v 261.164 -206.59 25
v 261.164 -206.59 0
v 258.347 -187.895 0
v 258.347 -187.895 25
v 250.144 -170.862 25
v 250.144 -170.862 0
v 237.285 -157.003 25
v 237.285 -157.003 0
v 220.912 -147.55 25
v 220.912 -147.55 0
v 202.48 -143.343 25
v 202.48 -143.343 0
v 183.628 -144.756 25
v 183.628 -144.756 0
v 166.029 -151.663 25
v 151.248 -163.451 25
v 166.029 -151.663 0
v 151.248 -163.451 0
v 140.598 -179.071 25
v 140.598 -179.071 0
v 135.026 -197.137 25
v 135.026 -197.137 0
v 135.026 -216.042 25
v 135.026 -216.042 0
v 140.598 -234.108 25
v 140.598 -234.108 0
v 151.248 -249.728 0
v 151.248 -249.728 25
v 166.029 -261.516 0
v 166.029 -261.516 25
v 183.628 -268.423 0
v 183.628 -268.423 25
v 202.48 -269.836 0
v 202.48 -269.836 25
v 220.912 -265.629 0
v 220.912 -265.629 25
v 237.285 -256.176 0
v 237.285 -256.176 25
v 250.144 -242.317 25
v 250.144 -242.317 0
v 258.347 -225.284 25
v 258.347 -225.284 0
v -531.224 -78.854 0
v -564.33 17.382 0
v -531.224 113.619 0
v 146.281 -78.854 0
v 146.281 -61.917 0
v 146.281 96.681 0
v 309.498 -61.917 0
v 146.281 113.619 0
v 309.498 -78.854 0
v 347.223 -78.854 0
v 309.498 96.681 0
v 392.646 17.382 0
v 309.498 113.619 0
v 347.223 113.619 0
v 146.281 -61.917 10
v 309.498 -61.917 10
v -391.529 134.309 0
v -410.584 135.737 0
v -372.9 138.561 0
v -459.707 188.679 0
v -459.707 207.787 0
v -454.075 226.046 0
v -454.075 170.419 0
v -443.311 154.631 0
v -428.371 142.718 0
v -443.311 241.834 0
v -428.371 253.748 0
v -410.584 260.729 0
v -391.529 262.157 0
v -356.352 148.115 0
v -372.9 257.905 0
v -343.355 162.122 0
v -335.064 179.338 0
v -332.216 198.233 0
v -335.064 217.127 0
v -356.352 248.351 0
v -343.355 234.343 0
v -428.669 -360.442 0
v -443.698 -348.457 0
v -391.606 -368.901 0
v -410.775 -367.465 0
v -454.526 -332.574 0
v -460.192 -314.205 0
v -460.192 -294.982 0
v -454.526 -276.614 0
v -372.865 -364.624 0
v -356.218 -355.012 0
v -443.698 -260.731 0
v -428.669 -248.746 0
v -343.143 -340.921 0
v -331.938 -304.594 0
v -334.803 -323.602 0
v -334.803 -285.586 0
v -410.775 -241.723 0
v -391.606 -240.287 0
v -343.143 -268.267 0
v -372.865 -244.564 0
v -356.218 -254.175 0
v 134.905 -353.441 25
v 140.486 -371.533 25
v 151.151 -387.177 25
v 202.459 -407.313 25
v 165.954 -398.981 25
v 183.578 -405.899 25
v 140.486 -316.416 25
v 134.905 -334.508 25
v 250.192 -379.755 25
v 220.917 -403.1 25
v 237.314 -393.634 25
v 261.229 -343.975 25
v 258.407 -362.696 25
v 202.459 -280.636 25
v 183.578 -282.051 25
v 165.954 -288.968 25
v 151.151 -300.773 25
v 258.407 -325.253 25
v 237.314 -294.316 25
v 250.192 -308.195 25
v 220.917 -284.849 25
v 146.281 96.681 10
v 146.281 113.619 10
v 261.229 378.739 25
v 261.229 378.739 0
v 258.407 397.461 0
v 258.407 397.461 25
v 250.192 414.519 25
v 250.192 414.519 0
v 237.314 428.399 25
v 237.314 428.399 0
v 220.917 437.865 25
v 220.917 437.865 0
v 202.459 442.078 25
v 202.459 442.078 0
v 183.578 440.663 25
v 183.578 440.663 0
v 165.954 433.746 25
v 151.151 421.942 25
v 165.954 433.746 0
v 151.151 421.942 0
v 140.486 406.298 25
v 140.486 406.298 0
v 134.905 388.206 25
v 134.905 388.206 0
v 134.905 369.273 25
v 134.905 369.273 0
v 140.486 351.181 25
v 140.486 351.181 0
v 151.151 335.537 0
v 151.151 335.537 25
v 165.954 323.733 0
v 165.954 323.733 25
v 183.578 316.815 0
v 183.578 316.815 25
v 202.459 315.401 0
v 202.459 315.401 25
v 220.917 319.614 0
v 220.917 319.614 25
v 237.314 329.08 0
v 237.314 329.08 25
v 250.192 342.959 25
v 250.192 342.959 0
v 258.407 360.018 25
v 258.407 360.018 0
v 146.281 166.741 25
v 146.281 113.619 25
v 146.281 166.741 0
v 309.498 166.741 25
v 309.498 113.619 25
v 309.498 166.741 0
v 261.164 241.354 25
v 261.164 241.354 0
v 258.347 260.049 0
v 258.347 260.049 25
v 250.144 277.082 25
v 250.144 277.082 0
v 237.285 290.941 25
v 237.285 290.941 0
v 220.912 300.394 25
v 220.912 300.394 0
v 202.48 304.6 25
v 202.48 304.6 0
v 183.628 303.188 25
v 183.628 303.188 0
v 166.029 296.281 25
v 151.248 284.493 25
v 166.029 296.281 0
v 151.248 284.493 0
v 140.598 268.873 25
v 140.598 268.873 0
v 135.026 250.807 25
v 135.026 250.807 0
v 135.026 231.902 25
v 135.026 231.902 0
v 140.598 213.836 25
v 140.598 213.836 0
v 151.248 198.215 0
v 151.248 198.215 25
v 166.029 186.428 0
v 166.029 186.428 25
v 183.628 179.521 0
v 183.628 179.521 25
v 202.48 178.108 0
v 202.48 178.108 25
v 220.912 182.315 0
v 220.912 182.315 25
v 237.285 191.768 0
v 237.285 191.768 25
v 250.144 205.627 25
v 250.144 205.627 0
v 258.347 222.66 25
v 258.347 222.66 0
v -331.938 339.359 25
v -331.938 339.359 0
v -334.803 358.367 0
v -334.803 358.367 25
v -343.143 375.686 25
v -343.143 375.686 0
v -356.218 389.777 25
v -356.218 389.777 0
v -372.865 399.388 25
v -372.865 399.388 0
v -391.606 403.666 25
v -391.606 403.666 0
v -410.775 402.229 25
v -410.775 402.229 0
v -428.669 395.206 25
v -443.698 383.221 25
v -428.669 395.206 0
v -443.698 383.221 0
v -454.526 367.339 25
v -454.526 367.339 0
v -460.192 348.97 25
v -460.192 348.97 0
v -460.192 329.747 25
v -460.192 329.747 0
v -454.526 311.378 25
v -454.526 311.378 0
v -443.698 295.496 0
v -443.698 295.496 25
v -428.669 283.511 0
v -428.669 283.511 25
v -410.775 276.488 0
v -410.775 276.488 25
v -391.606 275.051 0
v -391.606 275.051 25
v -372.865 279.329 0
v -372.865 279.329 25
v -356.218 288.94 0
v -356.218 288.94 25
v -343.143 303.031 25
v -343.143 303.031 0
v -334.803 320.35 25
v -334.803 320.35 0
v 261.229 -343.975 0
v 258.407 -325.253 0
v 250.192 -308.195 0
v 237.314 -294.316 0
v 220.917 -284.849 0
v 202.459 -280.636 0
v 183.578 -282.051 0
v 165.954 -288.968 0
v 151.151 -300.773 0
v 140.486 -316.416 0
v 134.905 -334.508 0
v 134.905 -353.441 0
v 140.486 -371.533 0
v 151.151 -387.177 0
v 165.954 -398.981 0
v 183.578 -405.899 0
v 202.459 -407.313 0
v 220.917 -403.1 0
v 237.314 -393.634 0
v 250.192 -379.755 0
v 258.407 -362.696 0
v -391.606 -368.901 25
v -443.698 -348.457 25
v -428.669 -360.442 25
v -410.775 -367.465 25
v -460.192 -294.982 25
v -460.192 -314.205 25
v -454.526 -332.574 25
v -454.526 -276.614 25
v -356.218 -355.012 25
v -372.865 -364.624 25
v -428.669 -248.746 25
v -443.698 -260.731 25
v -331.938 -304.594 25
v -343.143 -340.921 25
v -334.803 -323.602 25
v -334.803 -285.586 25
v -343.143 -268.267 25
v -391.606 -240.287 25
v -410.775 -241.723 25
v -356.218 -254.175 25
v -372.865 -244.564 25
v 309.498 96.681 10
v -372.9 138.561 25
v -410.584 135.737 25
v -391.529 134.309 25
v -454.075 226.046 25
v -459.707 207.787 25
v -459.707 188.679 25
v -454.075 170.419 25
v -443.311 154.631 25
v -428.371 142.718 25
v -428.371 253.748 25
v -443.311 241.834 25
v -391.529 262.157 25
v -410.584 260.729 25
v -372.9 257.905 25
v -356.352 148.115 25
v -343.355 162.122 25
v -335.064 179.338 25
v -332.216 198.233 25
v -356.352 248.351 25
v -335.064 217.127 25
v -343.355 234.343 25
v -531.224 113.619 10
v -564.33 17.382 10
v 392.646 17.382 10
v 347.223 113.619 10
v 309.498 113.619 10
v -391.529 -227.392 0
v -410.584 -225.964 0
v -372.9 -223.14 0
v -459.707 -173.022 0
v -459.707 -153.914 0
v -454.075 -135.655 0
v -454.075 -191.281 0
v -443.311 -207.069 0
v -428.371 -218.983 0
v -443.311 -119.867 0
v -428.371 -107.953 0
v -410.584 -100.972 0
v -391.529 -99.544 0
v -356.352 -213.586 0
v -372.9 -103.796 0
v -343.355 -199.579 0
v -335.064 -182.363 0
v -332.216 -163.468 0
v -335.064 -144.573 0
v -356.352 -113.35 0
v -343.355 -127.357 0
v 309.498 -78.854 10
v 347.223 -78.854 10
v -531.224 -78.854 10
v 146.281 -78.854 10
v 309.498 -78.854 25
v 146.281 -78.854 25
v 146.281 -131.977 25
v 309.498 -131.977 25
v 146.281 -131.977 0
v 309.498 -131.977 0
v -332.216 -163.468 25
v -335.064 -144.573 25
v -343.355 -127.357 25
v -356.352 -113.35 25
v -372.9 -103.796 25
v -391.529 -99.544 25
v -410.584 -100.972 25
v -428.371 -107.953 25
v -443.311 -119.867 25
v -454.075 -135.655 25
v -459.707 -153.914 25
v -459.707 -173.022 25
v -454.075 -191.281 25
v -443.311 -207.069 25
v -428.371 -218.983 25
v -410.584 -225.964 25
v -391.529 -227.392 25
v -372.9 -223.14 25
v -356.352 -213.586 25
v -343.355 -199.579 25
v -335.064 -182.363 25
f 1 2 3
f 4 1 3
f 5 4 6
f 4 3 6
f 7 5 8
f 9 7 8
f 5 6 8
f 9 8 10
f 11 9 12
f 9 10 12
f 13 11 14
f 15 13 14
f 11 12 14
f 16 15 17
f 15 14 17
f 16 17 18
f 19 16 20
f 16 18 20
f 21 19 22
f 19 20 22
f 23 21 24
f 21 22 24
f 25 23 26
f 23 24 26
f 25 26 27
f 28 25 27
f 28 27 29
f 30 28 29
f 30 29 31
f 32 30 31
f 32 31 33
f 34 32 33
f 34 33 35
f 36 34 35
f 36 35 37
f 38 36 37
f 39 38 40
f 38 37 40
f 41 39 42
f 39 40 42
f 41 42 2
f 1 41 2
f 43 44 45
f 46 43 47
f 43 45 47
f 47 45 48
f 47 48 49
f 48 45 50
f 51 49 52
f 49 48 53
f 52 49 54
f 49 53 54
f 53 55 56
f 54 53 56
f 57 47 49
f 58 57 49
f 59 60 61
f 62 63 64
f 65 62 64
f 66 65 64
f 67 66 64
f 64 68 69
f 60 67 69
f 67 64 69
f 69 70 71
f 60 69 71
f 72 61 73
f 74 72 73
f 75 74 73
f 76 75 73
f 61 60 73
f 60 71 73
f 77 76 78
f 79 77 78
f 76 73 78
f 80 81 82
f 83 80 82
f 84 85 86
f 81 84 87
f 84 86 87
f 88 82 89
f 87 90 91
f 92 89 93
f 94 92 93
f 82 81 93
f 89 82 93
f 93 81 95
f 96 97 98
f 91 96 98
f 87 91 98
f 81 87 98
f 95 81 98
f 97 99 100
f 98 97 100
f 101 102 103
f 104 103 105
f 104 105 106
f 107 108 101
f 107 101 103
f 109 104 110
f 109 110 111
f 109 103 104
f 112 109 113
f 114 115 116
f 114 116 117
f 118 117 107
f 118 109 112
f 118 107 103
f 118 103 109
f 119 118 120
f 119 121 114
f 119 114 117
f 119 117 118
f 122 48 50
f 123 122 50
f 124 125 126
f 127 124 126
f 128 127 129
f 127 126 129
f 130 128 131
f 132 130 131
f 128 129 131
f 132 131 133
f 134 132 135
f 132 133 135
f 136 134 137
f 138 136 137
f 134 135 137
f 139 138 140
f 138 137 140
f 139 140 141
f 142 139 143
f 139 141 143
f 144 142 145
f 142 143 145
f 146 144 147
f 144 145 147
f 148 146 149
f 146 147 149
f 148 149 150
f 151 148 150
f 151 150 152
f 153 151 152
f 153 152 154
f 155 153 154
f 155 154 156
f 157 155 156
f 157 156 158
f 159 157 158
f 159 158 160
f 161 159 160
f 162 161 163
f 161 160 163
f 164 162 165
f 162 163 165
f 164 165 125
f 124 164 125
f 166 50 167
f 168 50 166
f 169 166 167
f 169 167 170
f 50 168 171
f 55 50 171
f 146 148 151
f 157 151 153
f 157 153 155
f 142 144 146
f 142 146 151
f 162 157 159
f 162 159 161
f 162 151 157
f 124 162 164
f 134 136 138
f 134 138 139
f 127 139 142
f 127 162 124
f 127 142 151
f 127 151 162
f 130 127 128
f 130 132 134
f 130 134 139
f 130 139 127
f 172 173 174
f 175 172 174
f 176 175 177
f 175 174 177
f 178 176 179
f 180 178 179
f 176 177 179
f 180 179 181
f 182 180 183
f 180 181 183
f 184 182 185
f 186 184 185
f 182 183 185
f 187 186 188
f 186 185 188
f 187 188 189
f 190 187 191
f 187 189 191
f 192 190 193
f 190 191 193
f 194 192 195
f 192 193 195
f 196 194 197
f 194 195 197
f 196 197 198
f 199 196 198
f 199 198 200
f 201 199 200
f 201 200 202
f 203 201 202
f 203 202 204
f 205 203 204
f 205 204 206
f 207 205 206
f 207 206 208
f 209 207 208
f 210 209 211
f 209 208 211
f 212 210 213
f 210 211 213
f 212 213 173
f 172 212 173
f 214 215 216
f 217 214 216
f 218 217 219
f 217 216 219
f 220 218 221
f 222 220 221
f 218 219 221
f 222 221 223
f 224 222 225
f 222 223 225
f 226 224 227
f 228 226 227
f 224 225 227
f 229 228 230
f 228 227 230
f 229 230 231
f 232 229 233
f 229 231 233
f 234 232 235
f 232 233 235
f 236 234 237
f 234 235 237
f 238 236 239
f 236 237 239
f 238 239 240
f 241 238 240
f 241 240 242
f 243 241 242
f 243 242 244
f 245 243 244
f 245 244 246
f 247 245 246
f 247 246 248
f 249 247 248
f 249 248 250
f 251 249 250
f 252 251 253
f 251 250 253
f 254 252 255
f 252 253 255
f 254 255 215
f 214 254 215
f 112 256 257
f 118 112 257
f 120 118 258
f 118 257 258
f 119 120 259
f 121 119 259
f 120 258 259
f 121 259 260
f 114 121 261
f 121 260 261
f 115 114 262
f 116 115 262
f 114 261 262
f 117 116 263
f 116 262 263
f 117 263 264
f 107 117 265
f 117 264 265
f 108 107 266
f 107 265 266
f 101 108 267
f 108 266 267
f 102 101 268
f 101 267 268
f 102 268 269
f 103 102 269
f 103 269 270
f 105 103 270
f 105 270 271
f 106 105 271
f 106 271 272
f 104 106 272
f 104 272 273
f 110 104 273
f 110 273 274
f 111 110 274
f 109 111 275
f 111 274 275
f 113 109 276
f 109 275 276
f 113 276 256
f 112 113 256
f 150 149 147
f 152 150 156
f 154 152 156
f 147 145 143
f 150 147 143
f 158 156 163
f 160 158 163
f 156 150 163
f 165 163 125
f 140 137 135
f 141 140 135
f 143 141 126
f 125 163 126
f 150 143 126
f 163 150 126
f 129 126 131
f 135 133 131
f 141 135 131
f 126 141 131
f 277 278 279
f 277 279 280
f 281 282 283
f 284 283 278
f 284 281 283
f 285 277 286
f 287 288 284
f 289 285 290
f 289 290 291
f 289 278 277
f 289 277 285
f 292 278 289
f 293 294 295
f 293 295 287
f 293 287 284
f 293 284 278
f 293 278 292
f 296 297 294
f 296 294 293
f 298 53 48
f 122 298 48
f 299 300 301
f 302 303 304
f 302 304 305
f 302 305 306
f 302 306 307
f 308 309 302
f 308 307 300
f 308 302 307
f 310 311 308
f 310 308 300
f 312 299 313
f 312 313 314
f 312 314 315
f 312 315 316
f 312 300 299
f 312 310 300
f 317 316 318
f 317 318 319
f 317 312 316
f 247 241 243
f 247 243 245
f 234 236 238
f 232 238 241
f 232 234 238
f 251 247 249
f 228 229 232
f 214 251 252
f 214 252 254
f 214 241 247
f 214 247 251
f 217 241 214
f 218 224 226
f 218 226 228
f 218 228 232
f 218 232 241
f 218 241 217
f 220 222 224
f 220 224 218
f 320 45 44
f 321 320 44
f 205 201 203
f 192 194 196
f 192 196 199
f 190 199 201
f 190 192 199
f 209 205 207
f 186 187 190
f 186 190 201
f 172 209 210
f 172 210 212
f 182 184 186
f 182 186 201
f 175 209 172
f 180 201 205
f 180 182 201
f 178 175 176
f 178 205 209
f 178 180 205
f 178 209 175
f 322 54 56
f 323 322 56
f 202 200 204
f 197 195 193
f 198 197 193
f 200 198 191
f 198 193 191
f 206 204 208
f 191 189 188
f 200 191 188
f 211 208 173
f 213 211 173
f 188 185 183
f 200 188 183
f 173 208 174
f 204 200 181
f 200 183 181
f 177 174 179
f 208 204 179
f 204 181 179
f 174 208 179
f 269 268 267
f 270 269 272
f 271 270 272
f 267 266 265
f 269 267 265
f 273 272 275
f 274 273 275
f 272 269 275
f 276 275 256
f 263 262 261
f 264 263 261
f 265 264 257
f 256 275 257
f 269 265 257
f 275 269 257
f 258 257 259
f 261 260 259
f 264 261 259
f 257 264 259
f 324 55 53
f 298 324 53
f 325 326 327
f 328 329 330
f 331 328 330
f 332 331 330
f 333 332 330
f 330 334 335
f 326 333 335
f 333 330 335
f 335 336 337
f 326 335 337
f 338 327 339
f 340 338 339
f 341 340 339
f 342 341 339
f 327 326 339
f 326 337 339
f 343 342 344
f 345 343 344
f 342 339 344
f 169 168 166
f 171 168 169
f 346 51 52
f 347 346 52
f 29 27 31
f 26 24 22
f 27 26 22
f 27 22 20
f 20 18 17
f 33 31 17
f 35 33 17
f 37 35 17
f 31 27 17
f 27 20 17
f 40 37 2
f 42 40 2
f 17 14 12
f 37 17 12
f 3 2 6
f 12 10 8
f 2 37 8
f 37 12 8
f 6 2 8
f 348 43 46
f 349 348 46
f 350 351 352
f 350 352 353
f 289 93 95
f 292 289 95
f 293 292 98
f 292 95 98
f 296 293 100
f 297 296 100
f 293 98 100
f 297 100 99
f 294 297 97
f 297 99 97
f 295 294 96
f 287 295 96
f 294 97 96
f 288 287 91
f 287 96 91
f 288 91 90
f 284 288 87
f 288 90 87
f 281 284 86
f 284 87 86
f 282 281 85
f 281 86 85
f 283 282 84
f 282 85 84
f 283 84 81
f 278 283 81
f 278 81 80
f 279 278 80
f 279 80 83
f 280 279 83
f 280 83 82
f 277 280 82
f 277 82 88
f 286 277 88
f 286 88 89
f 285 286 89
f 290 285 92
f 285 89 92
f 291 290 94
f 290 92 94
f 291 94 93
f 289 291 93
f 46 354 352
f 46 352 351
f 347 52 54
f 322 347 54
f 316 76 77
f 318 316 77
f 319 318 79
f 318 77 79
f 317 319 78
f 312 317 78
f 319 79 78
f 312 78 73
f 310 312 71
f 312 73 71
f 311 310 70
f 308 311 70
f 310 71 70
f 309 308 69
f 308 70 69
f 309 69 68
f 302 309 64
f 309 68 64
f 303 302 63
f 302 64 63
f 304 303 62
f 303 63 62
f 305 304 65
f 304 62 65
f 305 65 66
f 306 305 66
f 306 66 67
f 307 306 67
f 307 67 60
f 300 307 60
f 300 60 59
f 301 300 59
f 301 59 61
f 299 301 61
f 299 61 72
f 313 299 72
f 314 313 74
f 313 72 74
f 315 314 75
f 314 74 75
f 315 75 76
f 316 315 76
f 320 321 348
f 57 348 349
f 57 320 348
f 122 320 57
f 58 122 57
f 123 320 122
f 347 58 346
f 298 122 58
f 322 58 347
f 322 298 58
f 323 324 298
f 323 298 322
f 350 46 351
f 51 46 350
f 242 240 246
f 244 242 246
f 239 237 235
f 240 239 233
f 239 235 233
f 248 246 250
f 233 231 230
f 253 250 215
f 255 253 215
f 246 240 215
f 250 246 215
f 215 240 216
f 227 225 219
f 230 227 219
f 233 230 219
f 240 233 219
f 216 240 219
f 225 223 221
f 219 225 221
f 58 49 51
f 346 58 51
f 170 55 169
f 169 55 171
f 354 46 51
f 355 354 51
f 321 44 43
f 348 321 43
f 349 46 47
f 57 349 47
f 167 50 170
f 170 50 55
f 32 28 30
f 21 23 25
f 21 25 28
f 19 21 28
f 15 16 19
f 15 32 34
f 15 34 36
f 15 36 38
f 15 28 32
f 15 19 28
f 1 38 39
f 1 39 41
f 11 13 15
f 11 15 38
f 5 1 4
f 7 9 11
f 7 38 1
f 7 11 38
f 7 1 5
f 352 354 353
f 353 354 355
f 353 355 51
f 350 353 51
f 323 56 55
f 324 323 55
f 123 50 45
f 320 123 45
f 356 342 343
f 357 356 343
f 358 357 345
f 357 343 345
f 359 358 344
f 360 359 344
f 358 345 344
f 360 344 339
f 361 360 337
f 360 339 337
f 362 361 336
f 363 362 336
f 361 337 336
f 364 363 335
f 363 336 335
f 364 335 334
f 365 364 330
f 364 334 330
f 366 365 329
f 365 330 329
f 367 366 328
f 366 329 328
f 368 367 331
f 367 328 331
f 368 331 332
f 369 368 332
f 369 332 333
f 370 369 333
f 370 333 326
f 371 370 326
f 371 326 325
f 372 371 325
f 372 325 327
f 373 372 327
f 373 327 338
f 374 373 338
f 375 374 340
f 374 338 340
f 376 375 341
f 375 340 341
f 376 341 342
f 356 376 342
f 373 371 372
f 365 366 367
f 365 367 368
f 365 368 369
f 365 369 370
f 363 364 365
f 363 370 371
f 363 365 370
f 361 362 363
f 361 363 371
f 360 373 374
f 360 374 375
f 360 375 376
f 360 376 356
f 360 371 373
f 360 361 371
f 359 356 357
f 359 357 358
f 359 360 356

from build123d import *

# Parameters (mm, degrees)
F0_R     = 64.103198
F0_R_2   = 64.487611
F0_R_3   = 63.516402
F0_R_4   = 63.423458
F0_W     = 163.217172
F0_H     = 53.122573
F0_H_2   = 53.122572
F1_DEPTH = 25
F2_DEPTH = 10


with BuildPart() as f1:
    # F0 (on Top) → F1 (new body)
    with BuildSketch(Plane.XY):
        with Locations((-396.319538, 198.23274)):
            Circle(F0_R)
        with Locations((-396.425158, 339.358509)):
            Circle(F0_R_2)
        with Locations((197.712183, 378.739387)):
            Circle(F0_R_3)
        with Locations((197.740838, 241.354287)):
            Circle(F0_R_4)
        with Locations((197.740838, -206.58958)):
            Circle(F0_R_4)
        with Locations((197.712183, -343.97468)):
            Circle(F0_R_3)
        with Locations((-396.319538, -163.468033)):
            Circle(F0_R)
        with Locations((-396.425158, -304.593801)):
            Circle(F0_R_2)
        with Locations((227.889337, 140.180174)):
            Rectangle(F0_W, F0_H)
        with Locations((227.889337, -105.415467)):
            Rectangle(F0_W, F0_H_2)
    extrude(amount=F1_DEPTH)


with BuildPart() as f2:
    # F0 (on Top) → F2 (new body)
    with BuildSketch(Plane.XY):
        Polygon((146.280751, 113.618888), (-531.224489, 113.618888), (-564.329803, 17.382354), (-531.224489, -78.854181), (146.280751, -78.854181), (146.280751, -61.916552), (309.497923, -61.916552), (309.497923, -78.854181), (347.222656, -78.854181), (392.646283, 17.382354), (347.222656, 113.618888), (309.497923, 113.618888), (309.497923, 96.68126), (146.280751, 96.68126), align=None)
    extrude(amount=F2_DEPTH)


solid = Compound([f1.part, f2.part])
